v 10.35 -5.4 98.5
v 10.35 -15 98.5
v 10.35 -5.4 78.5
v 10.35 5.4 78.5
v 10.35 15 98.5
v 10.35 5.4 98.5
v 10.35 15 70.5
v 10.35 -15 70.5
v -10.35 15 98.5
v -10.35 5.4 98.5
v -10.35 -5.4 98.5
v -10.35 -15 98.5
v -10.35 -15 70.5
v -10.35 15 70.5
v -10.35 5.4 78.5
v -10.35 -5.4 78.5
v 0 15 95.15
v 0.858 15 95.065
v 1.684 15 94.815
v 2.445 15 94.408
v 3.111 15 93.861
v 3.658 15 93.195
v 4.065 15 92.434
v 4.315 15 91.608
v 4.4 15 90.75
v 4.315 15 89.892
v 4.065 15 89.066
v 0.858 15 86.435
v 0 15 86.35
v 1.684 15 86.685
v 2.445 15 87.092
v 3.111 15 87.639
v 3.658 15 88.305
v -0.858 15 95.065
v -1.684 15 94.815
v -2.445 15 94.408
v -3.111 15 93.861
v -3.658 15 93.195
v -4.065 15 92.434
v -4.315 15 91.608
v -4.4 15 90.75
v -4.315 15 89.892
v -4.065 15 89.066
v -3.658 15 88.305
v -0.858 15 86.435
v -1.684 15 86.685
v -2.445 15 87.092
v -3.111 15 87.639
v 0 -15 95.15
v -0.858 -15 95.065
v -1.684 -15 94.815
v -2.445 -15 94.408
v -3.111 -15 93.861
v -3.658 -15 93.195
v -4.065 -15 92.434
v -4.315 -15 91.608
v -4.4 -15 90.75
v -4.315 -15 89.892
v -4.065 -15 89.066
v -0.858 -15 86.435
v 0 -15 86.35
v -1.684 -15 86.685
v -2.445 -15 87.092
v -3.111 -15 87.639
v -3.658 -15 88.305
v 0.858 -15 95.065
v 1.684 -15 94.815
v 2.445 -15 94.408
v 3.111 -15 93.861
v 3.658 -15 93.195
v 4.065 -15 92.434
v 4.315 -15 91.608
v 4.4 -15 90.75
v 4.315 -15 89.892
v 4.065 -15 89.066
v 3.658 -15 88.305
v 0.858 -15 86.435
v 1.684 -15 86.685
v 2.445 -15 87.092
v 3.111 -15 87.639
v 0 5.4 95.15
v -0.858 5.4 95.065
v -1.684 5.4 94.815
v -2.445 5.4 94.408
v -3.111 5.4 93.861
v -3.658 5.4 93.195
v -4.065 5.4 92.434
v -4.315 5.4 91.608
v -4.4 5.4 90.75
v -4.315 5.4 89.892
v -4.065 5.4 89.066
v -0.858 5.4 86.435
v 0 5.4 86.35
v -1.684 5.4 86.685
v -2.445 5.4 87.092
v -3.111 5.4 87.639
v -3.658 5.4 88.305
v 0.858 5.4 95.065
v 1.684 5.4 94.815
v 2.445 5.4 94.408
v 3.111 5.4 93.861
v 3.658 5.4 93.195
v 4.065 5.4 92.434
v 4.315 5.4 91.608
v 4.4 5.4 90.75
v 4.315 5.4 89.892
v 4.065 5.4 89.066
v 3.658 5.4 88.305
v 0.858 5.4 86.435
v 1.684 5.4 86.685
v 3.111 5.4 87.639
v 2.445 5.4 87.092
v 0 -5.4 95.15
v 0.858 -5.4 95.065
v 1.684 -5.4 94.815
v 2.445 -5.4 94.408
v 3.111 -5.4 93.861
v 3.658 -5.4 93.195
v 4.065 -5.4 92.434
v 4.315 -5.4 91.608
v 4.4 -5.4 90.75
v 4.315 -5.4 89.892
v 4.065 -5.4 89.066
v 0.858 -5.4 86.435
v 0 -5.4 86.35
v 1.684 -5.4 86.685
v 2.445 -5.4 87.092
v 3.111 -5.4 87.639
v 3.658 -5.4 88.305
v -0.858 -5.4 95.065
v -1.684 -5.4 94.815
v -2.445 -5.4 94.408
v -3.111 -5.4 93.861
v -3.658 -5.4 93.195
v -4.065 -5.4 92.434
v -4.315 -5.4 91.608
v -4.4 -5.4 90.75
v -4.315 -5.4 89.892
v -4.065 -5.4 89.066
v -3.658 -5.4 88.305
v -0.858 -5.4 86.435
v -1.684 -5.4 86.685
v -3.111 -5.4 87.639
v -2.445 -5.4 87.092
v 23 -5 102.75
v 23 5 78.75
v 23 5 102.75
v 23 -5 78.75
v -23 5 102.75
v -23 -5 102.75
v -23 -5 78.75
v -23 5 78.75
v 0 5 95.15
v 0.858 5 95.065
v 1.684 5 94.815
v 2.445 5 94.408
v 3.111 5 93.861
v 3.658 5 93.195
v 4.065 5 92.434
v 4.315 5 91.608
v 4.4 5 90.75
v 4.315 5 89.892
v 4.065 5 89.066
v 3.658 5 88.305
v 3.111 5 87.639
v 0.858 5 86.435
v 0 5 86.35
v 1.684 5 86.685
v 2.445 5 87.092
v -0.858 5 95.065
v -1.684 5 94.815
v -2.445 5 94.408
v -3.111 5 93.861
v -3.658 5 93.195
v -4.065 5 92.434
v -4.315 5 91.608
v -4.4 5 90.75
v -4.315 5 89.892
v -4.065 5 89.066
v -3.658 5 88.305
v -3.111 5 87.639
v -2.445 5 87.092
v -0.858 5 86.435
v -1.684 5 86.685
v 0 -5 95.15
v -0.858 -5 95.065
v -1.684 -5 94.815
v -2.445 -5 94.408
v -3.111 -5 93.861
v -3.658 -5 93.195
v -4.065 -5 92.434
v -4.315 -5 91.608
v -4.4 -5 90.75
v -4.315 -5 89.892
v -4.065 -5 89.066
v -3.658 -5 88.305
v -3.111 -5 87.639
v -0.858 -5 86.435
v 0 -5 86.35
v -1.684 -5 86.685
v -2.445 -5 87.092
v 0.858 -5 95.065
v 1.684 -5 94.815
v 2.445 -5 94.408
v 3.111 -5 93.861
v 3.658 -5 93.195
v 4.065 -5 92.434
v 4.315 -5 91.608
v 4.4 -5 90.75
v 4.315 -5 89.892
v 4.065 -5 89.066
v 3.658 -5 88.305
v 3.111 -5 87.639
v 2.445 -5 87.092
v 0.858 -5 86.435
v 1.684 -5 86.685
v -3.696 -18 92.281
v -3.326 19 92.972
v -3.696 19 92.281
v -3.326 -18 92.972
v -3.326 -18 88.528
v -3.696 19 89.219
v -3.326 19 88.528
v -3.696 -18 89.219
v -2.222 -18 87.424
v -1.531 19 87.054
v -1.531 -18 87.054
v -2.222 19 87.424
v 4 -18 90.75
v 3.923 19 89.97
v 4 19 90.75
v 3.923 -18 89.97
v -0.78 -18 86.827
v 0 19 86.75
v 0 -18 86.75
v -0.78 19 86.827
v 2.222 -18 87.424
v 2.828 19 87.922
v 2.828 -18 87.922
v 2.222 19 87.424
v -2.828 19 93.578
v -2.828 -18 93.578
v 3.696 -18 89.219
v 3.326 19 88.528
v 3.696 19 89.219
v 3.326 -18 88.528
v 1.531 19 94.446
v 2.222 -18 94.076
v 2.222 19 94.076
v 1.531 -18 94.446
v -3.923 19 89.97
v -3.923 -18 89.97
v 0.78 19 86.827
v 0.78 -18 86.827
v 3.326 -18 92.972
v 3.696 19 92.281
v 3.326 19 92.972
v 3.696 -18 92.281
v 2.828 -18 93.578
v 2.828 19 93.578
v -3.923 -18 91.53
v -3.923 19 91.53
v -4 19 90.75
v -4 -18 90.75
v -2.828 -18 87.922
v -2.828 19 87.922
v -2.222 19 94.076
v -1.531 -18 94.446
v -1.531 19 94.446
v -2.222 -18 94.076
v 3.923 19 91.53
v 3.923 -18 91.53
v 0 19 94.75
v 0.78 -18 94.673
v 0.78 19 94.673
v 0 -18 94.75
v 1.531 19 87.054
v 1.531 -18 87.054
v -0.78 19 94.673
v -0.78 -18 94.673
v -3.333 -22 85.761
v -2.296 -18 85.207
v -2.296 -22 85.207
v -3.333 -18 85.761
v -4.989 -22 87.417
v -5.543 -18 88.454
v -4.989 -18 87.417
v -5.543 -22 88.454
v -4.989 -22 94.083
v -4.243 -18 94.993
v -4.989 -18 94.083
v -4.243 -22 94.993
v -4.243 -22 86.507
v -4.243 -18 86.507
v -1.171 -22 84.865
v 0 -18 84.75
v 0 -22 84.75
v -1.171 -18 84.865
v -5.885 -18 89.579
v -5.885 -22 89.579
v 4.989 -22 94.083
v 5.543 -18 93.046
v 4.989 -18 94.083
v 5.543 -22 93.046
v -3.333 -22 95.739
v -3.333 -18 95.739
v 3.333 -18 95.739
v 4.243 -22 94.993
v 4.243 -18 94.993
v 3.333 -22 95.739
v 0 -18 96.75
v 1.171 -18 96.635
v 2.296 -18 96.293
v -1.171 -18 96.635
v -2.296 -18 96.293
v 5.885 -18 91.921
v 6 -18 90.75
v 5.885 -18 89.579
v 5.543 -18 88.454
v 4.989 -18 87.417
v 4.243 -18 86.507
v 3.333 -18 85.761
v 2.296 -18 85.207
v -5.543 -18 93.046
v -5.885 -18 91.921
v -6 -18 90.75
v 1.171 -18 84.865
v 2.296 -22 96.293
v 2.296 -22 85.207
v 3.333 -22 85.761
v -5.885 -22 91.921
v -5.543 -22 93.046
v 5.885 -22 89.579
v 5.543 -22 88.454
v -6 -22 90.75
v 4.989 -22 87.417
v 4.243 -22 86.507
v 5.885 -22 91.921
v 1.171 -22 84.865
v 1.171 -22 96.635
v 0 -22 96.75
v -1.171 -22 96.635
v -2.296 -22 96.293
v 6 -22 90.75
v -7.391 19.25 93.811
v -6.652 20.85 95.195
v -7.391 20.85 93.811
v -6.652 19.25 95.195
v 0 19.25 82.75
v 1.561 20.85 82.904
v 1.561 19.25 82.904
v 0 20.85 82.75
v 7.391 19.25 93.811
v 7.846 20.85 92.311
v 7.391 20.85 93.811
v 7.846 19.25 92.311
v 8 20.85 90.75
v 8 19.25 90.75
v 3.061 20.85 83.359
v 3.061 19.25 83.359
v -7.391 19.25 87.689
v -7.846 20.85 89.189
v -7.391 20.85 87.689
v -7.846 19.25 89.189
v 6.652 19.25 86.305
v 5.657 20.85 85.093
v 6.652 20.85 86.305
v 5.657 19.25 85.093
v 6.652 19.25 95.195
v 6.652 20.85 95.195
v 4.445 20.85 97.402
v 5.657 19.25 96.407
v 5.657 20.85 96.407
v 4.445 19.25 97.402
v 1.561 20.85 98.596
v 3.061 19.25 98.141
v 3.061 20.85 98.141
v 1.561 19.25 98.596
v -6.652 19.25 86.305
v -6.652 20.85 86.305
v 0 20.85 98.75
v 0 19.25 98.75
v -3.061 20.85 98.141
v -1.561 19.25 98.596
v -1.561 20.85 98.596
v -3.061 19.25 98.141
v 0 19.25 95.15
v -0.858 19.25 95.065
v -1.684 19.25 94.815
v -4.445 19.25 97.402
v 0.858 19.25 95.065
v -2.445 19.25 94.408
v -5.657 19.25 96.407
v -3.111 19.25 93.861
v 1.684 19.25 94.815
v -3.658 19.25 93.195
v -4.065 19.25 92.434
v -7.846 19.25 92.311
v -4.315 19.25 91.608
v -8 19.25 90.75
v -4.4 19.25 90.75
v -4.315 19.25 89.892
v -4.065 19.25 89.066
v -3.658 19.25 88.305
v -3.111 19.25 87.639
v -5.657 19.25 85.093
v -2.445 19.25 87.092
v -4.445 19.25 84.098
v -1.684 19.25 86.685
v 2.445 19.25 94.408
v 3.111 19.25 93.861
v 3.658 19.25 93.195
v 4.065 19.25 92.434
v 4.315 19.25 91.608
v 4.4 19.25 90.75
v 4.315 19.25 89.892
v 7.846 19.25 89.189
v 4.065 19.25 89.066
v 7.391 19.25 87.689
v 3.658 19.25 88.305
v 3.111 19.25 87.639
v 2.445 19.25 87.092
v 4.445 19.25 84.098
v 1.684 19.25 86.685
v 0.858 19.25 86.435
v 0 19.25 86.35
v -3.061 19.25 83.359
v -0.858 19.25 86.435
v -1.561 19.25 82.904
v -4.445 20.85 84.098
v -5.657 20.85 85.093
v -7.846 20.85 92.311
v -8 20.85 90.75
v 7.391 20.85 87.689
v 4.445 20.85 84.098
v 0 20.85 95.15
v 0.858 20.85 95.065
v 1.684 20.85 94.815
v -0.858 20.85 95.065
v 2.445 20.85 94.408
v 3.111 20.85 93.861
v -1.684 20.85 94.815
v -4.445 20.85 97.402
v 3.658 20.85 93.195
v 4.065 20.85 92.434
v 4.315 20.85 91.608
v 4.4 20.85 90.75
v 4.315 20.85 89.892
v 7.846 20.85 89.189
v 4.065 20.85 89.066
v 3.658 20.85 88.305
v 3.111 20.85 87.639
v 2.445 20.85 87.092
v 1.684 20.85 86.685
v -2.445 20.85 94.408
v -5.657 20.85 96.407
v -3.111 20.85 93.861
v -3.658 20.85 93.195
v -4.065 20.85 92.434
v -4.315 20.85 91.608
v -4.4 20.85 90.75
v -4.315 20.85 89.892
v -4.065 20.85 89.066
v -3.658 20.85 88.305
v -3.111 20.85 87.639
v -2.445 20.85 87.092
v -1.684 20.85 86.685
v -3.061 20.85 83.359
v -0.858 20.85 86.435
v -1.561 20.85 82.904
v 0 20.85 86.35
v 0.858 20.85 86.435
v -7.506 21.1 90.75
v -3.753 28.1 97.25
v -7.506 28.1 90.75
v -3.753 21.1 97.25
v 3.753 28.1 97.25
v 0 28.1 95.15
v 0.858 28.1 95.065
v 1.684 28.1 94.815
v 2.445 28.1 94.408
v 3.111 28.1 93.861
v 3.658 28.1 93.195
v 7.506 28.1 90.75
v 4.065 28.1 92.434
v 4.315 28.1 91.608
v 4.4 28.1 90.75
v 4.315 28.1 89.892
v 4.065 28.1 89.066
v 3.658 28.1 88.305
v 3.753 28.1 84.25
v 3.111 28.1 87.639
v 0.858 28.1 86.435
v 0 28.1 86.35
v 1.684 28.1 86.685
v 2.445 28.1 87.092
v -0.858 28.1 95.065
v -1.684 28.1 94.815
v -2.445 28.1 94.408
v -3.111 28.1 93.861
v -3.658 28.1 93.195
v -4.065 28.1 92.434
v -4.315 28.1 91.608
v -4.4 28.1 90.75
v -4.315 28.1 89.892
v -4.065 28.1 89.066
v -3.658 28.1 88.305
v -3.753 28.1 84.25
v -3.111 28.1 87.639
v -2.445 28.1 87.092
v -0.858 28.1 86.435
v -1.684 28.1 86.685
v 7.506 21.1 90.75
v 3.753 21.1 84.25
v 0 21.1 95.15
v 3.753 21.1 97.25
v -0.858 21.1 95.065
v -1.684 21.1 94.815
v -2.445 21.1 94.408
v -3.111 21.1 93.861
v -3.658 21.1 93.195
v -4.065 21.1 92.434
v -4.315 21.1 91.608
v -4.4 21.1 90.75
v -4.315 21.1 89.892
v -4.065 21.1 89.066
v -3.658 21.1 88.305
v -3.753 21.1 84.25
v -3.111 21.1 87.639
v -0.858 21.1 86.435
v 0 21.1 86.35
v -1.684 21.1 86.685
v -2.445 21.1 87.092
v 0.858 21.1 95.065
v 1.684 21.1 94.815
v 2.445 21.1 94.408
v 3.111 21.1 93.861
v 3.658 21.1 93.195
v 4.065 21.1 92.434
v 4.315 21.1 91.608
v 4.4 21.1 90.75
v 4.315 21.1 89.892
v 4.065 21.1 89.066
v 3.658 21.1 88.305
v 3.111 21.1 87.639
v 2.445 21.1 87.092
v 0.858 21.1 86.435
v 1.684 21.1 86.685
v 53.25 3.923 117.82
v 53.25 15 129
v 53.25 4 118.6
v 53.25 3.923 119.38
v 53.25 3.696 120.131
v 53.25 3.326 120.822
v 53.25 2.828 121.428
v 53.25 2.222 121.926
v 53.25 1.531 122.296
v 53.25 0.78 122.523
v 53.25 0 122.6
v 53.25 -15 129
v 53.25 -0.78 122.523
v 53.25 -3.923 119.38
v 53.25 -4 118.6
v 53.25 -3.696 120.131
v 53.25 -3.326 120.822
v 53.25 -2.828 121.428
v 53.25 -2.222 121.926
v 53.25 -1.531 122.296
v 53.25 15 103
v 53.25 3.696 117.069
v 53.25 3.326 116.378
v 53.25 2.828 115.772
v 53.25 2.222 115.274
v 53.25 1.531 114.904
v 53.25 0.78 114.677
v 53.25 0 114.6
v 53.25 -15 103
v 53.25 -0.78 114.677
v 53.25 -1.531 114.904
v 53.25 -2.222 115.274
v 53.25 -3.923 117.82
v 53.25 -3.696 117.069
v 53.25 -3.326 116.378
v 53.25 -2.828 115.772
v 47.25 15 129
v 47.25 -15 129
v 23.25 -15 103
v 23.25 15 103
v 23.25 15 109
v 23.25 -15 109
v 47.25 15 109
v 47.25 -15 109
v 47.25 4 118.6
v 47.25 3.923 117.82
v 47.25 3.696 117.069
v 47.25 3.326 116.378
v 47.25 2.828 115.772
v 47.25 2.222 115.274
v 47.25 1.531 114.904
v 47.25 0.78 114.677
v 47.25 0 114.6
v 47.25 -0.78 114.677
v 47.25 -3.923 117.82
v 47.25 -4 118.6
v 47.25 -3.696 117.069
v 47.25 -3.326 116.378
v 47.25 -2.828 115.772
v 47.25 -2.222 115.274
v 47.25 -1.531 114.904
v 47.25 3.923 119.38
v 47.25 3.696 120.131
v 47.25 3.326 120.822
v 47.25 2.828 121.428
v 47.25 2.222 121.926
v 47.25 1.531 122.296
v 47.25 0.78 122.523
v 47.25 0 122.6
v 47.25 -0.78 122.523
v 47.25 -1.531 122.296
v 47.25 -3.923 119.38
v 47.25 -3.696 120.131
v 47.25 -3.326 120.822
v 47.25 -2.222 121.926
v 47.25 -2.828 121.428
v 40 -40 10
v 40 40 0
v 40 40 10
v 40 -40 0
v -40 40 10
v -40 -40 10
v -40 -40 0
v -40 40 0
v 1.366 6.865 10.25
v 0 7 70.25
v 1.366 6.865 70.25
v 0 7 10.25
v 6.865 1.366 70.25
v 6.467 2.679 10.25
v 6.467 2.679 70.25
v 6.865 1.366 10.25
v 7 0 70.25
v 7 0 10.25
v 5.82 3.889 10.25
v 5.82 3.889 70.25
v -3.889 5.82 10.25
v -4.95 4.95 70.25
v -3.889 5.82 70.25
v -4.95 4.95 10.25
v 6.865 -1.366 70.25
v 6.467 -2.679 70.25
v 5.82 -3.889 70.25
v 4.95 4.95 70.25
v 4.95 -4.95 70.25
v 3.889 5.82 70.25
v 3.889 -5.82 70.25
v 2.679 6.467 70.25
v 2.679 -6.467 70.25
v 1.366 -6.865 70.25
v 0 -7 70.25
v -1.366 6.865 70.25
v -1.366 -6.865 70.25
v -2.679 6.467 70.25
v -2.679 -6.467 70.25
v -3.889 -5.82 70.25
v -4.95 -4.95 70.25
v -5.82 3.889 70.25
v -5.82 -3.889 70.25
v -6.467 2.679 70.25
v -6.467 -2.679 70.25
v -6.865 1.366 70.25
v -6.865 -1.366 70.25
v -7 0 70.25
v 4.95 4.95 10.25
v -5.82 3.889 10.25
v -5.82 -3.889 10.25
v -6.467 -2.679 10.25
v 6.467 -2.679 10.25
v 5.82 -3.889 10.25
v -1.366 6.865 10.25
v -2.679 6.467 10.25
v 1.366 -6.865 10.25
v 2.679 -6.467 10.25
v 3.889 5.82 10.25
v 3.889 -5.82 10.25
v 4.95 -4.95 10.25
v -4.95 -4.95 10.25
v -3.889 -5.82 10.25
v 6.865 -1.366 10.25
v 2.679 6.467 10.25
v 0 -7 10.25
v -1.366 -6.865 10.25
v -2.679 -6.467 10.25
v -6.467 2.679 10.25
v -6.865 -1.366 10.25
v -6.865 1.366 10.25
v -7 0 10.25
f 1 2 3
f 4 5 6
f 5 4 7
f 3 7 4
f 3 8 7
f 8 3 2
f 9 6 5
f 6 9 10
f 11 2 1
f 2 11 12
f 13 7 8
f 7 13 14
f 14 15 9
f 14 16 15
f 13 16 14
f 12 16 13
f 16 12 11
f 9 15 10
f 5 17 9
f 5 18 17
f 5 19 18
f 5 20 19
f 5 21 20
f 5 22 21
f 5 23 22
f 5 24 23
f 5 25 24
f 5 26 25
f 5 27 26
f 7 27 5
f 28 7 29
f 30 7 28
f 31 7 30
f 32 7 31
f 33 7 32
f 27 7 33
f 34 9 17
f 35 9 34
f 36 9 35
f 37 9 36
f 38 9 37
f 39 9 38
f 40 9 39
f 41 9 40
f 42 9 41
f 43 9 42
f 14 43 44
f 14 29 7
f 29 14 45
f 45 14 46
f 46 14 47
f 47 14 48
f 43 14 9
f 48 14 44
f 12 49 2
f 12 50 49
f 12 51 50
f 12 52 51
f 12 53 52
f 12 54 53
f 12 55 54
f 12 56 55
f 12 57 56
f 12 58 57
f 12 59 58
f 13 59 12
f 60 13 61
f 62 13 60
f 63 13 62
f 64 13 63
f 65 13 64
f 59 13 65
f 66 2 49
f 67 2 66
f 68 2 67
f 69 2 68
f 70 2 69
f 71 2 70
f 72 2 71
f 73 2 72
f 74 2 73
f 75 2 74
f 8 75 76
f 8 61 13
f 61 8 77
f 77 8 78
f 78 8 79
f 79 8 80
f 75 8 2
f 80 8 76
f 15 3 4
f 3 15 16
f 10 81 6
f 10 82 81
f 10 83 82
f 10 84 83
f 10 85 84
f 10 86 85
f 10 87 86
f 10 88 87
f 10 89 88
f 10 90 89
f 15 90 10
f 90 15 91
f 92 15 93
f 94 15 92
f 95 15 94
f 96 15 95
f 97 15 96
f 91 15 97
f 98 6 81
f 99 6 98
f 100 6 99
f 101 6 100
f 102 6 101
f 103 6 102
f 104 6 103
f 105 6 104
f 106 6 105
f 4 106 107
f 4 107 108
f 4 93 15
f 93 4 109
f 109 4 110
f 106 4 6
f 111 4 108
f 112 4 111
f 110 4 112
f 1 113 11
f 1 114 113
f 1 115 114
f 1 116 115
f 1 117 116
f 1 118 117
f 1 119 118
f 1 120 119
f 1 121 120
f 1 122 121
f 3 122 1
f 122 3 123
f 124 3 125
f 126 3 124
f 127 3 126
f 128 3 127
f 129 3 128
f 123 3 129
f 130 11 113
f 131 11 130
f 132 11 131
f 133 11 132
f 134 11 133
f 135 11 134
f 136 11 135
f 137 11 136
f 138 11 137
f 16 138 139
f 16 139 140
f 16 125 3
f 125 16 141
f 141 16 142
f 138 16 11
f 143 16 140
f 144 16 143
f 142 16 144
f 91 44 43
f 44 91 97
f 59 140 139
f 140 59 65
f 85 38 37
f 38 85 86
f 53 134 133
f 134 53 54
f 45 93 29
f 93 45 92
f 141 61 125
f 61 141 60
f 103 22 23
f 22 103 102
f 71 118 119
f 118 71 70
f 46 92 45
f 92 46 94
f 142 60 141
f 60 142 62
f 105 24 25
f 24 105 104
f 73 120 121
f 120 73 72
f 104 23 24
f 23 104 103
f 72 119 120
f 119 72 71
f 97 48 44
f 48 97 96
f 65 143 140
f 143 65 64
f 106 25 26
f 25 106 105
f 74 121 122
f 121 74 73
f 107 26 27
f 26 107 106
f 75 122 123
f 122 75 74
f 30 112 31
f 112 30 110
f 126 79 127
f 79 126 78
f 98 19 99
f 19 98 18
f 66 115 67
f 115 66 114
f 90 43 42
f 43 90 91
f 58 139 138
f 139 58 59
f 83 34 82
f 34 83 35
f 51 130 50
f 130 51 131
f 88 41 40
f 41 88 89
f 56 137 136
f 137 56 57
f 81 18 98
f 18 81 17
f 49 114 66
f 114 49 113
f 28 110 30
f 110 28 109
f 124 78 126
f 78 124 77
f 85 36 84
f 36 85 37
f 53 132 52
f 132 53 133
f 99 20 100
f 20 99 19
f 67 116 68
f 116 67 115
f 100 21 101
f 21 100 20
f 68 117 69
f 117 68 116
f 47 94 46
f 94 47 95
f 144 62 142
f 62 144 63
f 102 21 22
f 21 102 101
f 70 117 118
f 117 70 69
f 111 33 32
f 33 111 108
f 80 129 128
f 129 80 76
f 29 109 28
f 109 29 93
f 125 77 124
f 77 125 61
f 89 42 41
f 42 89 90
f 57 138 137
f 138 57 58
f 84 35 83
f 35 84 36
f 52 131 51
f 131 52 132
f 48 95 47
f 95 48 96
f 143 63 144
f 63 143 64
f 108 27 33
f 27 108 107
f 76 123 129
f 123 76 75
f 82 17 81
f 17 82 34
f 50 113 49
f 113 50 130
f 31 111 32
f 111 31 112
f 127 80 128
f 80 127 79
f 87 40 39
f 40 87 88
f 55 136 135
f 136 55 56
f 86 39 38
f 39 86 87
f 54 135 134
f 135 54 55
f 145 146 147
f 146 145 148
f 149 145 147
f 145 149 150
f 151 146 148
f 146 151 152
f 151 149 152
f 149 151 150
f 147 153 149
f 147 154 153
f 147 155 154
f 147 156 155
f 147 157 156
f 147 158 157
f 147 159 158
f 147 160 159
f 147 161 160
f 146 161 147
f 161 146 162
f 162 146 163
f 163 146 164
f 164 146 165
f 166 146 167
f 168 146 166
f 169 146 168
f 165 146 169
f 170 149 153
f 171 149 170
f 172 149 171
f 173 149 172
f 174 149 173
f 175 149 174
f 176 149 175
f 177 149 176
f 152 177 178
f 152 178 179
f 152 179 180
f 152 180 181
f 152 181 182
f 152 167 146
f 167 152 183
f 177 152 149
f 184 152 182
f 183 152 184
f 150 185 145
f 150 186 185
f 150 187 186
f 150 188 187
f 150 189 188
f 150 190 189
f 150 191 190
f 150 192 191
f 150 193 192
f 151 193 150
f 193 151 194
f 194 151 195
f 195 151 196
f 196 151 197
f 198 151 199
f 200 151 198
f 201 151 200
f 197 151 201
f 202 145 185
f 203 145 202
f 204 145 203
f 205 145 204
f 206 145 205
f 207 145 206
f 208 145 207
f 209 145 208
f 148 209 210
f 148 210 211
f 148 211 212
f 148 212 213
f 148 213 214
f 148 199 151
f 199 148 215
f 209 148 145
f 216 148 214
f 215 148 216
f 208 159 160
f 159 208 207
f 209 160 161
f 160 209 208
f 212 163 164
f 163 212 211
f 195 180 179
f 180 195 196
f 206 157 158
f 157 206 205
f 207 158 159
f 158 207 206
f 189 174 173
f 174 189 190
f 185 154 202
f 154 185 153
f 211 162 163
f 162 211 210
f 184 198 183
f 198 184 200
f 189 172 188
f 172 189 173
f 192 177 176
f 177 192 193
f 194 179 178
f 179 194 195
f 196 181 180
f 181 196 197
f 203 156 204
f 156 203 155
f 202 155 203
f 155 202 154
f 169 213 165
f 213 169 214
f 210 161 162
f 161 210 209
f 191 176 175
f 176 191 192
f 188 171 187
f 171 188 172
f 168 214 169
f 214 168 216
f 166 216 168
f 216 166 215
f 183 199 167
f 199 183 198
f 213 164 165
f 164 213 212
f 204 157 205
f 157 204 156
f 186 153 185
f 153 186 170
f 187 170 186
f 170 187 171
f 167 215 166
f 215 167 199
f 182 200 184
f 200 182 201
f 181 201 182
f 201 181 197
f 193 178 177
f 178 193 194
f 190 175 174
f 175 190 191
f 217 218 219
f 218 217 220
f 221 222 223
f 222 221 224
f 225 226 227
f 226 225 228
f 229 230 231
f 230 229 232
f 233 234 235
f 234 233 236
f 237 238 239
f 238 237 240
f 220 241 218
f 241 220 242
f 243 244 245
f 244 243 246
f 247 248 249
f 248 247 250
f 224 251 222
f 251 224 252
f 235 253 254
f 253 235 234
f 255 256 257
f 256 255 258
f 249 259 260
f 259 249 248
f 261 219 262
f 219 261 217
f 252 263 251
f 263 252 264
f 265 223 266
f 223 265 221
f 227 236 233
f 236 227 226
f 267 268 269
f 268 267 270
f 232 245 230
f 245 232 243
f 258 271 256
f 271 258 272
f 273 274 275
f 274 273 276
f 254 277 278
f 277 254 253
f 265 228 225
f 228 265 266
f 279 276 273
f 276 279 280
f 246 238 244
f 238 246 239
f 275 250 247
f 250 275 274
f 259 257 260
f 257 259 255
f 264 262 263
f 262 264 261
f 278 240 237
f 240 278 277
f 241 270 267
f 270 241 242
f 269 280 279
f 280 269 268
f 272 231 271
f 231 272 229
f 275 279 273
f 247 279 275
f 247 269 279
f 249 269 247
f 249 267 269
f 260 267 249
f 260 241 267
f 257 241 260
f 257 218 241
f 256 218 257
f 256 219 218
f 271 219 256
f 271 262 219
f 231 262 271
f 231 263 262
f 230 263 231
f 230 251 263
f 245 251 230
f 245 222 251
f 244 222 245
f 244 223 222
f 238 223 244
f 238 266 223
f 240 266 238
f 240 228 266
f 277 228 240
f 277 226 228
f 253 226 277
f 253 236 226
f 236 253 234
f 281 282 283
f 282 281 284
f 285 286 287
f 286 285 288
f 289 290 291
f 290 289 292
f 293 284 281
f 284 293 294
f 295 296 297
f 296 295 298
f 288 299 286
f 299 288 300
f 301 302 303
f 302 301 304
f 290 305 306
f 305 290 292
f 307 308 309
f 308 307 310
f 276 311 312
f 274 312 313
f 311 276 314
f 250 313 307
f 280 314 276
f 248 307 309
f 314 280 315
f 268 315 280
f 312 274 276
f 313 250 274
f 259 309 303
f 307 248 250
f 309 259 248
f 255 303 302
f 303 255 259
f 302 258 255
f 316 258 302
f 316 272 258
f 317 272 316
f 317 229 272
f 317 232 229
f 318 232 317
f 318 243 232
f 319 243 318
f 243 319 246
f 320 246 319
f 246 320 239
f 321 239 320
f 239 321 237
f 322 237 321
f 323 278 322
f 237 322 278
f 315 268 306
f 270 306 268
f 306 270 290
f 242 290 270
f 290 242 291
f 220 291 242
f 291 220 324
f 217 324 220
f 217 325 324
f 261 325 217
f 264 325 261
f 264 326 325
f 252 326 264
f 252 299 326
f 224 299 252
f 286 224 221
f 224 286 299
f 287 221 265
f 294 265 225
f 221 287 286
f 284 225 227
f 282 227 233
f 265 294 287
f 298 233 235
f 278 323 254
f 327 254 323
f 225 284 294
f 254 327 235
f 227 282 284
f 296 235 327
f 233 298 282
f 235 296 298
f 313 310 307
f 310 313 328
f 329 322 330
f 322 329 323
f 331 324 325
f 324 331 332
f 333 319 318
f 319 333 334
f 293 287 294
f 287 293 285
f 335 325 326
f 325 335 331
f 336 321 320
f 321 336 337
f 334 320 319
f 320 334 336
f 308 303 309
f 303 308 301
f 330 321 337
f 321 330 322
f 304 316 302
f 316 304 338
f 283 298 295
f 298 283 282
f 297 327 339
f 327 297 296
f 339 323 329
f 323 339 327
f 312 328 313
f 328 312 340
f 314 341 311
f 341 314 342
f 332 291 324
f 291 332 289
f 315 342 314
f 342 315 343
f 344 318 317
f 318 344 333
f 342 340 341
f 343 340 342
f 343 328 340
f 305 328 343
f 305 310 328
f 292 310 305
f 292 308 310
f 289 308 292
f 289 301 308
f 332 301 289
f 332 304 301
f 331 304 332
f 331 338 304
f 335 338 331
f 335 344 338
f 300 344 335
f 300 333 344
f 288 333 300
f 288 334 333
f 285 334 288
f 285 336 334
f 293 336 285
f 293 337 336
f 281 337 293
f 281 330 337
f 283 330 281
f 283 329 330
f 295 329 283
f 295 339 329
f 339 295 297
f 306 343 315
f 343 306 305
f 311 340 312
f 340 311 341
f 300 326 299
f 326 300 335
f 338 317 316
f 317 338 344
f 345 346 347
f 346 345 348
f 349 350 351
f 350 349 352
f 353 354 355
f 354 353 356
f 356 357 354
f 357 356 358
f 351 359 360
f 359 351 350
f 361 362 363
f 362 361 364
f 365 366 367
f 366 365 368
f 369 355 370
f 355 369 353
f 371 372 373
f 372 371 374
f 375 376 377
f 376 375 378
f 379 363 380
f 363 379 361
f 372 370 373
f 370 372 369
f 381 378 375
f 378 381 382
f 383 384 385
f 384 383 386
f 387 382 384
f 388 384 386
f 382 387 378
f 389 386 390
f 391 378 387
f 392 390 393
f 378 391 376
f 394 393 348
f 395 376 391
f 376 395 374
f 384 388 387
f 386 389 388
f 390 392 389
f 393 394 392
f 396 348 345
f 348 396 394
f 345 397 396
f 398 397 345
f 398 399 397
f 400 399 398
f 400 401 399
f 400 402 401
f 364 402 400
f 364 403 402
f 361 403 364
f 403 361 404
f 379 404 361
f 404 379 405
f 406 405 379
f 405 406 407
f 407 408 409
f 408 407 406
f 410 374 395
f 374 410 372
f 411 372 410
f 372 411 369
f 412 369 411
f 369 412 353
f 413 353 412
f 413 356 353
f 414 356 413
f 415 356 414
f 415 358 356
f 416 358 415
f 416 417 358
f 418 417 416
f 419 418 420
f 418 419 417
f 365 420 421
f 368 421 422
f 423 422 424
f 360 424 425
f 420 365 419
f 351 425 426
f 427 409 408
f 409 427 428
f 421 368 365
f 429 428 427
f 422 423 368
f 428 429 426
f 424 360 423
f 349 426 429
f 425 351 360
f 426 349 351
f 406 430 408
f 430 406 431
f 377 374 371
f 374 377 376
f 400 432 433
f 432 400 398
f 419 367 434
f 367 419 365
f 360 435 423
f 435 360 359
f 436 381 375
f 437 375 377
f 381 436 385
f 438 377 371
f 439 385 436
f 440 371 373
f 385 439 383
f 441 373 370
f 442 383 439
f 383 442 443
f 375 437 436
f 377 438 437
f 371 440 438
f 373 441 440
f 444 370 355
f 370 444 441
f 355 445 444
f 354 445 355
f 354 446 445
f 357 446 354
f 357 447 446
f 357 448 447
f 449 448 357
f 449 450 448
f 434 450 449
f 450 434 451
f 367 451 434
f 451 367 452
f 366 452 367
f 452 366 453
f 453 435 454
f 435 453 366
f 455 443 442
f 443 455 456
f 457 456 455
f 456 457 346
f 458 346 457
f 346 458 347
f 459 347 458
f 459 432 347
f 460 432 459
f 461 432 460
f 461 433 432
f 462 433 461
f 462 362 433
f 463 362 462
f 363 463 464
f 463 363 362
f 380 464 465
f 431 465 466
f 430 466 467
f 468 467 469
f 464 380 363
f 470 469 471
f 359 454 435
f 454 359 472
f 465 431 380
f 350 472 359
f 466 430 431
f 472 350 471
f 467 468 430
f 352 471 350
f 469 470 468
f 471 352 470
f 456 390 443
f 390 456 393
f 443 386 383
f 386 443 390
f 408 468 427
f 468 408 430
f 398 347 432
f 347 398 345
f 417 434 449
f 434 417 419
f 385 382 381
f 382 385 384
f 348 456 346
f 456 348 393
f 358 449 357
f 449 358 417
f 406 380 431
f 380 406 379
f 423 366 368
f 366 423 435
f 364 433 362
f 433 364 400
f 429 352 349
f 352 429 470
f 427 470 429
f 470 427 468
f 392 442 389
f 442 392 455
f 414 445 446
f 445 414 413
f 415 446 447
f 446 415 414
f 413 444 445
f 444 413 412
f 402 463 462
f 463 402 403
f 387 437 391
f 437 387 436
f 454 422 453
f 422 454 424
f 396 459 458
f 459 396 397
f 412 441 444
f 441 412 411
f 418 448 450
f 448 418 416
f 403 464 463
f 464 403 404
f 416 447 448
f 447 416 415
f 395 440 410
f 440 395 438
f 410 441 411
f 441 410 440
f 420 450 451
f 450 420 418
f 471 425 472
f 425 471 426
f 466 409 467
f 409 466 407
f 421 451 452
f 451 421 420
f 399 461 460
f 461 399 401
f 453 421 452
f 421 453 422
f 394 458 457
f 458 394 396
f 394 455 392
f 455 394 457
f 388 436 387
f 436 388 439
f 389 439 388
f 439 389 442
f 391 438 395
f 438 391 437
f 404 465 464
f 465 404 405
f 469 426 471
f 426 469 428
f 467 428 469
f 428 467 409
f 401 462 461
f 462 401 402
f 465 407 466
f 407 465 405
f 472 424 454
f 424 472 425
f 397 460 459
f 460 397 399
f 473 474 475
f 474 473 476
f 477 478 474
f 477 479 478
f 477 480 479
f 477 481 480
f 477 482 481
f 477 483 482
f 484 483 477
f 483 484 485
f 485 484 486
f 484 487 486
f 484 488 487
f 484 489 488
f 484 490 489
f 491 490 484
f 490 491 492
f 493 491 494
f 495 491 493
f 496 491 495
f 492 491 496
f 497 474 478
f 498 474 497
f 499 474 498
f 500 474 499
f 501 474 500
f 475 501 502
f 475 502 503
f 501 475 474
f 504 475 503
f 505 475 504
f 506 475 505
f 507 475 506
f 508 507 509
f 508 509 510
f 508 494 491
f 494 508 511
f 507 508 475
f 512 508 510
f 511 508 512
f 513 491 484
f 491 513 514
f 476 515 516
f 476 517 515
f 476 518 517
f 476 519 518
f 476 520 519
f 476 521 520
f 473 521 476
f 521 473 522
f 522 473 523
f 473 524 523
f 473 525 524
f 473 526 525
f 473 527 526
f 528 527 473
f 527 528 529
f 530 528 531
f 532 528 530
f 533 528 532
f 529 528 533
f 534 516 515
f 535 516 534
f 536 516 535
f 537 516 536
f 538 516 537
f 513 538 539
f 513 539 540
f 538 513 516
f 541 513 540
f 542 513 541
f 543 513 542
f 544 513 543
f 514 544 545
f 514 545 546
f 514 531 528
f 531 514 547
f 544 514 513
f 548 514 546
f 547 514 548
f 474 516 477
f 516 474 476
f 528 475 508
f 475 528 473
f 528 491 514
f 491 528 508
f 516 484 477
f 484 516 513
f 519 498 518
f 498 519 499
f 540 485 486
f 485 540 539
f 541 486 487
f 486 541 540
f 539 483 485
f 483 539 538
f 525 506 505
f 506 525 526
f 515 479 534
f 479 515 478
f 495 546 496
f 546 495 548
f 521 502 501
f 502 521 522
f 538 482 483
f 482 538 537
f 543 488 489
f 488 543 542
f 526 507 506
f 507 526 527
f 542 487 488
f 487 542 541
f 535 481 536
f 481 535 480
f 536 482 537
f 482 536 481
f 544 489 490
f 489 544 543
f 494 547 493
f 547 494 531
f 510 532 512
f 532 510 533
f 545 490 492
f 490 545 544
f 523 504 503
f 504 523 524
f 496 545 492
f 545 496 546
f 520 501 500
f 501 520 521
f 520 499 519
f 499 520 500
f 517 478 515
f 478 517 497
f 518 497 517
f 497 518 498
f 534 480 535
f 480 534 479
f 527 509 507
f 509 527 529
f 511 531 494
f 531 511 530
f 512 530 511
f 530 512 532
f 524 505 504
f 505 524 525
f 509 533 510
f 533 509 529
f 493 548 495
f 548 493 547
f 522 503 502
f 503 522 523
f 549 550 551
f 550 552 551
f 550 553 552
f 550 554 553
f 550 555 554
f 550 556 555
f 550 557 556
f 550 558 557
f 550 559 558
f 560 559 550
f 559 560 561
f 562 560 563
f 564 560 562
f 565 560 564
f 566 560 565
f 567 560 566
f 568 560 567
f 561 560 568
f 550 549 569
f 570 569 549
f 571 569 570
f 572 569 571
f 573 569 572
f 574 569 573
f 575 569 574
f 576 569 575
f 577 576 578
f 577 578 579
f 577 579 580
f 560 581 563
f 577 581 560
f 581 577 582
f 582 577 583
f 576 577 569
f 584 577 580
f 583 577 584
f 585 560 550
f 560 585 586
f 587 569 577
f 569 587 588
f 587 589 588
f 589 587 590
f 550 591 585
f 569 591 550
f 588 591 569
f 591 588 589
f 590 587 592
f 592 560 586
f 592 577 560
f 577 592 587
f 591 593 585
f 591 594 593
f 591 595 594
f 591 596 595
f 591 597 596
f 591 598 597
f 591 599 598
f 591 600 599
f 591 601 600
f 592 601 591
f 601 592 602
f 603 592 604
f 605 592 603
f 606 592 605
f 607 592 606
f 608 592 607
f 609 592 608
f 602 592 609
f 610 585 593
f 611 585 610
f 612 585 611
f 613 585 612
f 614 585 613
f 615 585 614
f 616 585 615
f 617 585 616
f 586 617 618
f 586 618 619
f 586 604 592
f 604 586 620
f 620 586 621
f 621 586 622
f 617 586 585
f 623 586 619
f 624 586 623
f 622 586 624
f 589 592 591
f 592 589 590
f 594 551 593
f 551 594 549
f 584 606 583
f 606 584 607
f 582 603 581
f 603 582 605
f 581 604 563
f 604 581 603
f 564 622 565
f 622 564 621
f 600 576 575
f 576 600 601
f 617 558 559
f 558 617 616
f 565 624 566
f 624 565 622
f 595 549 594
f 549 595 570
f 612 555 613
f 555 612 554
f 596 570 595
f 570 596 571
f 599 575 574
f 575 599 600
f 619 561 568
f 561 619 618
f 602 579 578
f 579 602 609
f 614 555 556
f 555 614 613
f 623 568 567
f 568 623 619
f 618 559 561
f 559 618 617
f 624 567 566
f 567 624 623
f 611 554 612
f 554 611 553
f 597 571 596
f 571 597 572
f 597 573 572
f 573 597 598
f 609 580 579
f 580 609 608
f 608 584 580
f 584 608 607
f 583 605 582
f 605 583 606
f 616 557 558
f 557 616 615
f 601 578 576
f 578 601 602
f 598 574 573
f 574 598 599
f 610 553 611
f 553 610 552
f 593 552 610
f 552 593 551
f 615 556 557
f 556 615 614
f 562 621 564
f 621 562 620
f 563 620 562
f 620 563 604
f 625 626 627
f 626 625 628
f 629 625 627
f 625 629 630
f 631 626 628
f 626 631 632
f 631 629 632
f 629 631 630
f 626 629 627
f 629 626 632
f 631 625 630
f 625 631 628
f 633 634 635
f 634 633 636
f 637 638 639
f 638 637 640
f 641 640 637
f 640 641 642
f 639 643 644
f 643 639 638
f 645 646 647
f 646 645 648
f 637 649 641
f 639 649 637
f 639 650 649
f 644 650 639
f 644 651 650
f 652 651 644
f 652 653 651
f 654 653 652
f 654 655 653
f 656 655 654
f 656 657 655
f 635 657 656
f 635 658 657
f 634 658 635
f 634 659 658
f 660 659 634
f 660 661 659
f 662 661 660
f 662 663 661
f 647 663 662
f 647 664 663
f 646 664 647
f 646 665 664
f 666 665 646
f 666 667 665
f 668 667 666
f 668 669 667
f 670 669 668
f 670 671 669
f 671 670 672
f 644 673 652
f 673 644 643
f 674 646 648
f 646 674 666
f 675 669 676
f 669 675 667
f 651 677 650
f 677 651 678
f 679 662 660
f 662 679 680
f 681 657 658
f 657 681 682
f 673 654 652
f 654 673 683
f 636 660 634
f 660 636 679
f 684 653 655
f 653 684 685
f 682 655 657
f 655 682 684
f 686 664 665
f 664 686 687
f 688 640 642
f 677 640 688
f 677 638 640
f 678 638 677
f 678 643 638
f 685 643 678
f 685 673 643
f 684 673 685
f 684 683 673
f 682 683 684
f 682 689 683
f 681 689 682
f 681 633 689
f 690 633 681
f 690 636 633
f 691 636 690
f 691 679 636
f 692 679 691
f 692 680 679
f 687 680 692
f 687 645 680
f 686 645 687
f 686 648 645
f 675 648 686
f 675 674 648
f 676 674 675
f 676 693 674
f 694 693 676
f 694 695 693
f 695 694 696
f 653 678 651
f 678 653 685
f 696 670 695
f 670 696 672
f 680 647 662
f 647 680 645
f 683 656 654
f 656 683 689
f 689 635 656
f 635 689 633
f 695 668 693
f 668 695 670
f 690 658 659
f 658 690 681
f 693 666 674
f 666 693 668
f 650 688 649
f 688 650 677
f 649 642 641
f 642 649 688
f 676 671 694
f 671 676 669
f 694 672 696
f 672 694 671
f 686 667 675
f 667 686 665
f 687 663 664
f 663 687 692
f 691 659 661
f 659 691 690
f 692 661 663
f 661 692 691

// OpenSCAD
$fn = 32;

// ------------------------------------------------------------------------
// Lamp arm: column d14 x 60 mm, arm 46 mm
// Every part is its own module, assembly() places every instance.
// ------------------------------------------------------------------------

// --- part 1 ---
module lamp_base() {
  difference() {
    translate([-40, -40, 0]) cube([80, 80, 10]);
  }
}

// --- part 2 ---
module lamp_column() {
  cylinder(h = 60, d = 14);
}

// --- part 3 ---
module head_fork() {
  difference() {
    translate([-10.35, -15, 0]) cube([20.7, 30, 28]);
    translate([-11.35, -5.4, 8]) cube([22.7, 10.8, 21]);
    translate([0, 0, 20.25]) rotate([90, 0, 0]) cylinder(h = 32, d = 8.8, center = true);
  }
}

// --- part 4 ---
module lamp_arm() {
  difference() {
    translate([-23, -5, 0]) cube([46, 10, 24]);
    translate([0, 0, 12]) rotate([90, 0, 0]) cylinder(h = 12, d = 8.8, center = true);
  }
}

// --- part 5 ---
module arm_pin() {
  rotate([0, 90, 0]) cylinder(h = 38, d = 8, center = true);
  translate([-22, 0, 0]) rotate([0, 90, 0]) cylinder(h = 4, d = 12);
}

// --- part 6 ---
module arm_washer() {
  difference() {
      translate([0, 0, 0]) cylinder(h = 1.6, d = 16);
      translate([0, 0, -1]) cylinder(h = 3.6, d = 8.8);
    }
}

// --- part 7 ---
module arm_nut() {
  difference() {
    linear_extrude(height = 7) polygon(points = [[7.506, 0], [3.753, 6.5], [-3.753, 6.5], [-7.506, 0], [-3.753, -6.5], [3.753, -6.5]]);
    translate([0, 0, -1]) cylinder(h = 9, d = 8.8);
  }
}

// --- part 8 ---
module shade_bracket() {
  difference() {
    translate([-15, -15, 0]) cube([30, 30, 26]);
    translate([-16, -16, 6]) cube([25, 32, 21]);
    translate([12, 0, 15.6]) rotate([0, 90, 0]) cylinder(h = 8, d = 8, center = true);
  }
}

// --- assembly ---
module assembly() {
  color([0.80, 0.24, 0.20]) translate([0, 0, 0]) rotate([0, 0, 0]) lamp_base();
  color([0.20, 0.45, 0.75]) translate([0, 0, 10.25]) rotate([0, 0, 0]) lamp_column();
  color([0.25, 0.62, 0.32]) translate([0, 0, 70.5]) rotate([0, 0, 0]) head_fork();
  color([0.92, 0.70, 0.18]) translate([0, 0, 78.75]) rotate([0, 0, 0]) lamp_arm();
  color([0.58, 0.35, 0.70]) translate([0, 0, 90.75]) rotate([0, 0, 90]) arm_pin();
  color([0.16, 0.66, 0.66]) translate([0, 20.85, 90.75]) rotate([90, 0, 0]) arm_washer();
  color([0.85, 0.48, 0.18]) translate([0, 28.1, 90.75]) rotate([90, 0, 0]) arm_nut();
  color([0.55, 0.60, 0.65]) translate([38.25, 0, 103]) rotate([0, 0, 0]) shade_bracket();
}

assembly();
